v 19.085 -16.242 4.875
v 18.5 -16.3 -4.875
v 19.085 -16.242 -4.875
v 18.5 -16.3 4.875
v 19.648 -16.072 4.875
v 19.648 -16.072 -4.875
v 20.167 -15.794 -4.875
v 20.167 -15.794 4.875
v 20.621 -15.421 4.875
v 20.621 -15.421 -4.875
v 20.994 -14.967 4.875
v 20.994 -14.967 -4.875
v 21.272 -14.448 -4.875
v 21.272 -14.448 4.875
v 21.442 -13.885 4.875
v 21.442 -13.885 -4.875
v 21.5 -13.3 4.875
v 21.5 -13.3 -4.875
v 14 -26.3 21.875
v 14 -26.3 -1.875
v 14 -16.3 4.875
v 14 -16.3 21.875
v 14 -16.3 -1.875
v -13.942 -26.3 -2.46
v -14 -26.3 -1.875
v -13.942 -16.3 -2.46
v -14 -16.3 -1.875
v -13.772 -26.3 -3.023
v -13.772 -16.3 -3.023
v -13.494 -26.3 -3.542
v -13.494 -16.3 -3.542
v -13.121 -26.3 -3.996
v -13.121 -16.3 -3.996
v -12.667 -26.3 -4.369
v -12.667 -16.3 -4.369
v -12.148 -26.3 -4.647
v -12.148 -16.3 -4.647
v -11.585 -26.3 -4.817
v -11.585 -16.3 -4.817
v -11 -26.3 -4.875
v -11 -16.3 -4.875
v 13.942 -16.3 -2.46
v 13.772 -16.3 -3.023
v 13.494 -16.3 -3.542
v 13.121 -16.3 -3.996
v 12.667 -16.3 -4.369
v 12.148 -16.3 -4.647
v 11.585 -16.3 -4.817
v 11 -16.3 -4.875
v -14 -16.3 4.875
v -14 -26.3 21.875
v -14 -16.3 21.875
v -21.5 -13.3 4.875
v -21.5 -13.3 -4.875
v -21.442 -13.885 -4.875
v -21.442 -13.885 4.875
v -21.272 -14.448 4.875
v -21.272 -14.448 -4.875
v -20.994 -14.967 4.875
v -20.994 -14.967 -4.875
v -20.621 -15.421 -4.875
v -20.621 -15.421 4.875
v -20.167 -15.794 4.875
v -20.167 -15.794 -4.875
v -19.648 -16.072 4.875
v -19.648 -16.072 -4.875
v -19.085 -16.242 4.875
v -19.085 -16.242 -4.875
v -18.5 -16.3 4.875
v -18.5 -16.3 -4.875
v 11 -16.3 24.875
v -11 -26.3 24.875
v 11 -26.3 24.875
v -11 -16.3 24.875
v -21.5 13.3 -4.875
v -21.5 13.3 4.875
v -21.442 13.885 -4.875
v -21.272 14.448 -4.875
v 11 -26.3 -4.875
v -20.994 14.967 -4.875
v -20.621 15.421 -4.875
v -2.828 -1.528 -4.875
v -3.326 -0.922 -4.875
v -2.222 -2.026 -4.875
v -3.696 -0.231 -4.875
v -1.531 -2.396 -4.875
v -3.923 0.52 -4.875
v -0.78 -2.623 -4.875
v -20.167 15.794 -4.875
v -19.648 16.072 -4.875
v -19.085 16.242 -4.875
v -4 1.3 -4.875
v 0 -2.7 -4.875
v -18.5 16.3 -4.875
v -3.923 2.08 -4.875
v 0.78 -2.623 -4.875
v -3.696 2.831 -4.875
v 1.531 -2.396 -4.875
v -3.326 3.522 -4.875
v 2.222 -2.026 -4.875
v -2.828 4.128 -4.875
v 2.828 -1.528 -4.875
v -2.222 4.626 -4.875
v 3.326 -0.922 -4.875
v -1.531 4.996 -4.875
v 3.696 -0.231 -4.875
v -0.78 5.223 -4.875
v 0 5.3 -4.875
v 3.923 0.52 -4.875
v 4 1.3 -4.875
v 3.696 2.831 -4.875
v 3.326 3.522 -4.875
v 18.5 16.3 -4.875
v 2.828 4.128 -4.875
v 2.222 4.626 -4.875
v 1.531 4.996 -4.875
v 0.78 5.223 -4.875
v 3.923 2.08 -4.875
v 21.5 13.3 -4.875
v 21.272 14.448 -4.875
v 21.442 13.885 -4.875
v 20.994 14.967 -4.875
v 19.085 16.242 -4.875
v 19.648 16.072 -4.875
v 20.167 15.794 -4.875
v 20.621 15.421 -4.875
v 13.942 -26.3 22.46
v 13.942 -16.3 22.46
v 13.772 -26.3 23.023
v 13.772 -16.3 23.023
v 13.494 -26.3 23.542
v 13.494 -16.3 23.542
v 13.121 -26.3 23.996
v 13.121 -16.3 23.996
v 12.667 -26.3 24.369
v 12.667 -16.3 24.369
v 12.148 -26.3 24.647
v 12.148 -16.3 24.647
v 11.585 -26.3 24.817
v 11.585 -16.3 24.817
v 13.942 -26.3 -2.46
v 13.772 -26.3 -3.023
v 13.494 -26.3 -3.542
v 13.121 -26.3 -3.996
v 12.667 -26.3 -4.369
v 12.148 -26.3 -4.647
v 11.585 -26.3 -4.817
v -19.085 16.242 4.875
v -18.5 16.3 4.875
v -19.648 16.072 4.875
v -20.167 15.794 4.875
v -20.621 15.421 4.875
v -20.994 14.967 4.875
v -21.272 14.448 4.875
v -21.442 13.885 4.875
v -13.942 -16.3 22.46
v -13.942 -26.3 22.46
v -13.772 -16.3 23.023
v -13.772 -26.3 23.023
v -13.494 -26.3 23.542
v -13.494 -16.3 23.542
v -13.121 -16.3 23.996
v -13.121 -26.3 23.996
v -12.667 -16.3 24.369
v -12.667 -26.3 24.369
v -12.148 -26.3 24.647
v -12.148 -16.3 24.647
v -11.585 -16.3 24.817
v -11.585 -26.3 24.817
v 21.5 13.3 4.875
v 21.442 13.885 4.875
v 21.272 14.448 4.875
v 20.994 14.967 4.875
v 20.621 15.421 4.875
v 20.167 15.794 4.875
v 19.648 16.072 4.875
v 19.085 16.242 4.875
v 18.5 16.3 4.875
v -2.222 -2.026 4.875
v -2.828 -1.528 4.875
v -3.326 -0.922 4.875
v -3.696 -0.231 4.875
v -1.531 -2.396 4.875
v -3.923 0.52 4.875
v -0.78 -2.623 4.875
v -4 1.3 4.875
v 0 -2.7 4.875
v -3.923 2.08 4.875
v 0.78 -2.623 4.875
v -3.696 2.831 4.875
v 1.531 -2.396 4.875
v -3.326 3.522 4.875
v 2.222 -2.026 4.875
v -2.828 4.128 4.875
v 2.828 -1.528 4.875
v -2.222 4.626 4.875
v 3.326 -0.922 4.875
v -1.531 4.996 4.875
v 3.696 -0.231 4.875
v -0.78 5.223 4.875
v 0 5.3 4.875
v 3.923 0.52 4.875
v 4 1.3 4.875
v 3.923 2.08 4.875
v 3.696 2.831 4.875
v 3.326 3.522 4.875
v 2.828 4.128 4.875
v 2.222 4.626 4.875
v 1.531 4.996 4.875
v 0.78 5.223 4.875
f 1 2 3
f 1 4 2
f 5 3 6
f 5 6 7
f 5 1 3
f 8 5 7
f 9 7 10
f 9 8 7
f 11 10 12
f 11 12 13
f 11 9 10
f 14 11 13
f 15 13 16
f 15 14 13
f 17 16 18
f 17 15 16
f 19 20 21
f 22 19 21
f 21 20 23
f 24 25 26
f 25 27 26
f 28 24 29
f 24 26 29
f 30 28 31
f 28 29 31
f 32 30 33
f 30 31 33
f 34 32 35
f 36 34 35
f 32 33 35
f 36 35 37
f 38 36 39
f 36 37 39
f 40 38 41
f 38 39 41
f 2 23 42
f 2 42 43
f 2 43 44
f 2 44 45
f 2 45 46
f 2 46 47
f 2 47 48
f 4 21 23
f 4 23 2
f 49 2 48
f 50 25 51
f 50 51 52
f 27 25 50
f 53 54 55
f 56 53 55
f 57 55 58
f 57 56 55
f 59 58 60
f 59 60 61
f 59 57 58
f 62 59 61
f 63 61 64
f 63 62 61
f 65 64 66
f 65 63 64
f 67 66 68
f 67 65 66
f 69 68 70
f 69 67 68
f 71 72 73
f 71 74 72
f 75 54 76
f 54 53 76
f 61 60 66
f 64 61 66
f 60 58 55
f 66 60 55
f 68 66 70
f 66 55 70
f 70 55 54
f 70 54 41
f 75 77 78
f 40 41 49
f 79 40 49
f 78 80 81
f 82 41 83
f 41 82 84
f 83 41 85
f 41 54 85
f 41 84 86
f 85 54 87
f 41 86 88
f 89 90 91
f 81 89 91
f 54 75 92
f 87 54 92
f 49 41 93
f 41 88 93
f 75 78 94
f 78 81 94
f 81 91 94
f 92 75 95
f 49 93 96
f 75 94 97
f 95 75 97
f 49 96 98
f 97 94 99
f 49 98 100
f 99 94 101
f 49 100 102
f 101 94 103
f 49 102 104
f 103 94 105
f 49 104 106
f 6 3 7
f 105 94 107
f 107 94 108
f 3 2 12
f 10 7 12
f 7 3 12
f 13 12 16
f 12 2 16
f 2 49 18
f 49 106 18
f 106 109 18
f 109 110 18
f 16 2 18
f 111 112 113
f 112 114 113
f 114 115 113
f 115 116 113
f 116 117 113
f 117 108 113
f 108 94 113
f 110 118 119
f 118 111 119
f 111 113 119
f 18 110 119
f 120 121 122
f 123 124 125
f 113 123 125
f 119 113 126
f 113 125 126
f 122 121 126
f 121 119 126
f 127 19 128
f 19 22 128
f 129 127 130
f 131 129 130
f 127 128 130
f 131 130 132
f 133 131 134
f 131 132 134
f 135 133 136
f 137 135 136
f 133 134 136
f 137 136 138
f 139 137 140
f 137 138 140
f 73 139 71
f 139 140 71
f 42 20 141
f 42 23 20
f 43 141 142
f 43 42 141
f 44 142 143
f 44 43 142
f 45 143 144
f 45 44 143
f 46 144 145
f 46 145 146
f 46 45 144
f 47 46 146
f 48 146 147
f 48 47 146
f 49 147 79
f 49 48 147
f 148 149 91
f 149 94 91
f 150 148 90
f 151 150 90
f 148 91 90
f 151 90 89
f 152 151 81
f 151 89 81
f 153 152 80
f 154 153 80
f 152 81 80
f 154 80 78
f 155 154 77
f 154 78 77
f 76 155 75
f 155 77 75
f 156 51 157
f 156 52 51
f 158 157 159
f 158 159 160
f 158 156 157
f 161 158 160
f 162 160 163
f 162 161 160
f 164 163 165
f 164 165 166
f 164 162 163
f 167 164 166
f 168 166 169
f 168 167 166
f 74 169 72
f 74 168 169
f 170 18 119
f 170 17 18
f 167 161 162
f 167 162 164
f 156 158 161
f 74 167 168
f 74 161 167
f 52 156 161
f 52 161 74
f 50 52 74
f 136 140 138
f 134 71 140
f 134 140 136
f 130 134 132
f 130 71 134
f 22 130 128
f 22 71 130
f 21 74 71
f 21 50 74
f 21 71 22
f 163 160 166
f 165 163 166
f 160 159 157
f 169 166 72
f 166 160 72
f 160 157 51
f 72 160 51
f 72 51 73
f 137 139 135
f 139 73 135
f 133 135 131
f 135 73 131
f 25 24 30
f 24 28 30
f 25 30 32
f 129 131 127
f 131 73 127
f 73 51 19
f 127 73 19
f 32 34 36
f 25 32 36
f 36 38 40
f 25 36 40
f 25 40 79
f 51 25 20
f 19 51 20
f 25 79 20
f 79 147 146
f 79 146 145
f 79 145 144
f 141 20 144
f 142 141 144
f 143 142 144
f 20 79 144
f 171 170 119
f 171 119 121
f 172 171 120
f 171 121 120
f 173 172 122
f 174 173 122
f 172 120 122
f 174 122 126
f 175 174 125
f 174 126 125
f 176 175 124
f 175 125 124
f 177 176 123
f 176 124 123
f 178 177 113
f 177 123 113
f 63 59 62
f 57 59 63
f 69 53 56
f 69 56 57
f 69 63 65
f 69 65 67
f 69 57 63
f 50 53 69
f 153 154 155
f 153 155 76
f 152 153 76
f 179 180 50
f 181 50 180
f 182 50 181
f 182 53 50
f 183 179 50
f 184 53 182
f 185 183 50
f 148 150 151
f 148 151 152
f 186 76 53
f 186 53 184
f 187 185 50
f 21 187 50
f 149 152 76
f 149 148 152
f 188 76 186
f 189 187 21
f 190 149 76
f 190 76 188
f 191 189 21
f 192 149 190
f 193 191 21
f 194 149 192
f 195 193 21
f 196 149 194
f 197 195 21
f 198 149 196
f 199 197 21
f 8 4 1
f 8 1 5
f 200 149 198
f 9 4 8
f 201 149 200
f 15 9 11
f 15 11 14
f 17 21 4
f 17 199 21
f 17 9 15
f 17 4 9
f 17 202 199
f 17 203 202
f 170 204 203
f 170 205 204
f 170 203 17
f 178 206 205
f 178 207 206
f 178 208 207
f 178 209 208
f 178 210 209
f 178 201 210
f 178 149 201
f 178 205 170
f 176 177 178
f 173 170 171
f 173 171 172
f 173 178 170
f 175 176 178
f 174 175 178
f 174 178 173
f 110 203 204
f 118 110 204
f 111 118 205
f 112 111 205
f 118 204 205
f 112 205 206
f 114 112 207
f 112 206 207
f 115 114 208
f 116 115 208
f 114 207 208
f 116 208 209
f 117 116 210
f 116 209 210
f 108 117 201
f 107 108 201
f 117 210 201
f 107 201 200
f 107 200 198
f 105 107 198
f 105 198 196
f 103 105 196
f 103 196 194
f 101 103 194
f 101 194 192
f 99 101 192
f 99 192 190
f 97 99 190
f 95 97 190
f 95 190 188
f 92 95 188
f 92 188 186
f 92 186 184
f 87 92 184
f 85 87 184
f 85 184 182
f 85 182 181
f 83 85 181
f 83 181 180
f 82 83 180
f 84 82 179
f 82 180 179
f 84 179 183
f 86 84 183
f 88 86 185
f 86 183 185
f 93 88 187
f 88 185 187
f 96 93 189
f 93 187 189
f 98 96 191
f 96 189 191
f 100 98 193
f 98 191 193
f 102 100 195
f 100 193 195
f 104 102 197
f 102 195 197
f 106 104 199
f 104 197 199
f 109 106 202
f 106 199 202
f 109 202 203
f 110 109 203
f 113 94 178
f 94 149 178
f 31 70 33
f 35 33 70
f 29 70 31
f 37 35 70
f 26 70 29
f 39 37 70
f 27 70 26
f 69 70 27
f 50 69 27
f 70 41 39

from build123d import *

# Parameters (mm, degrees)
SKETCH1_W                       = 43
SKETCH1_H                       = 32.6
BOSS_EXTRUDE1_DEPTH             = 4.875
SKETCH2_R                       = 4
CUT_EXTRUDE1_DEPTH              = 29.688020148
BOSS_EXTRUDE3_REACH             = 30.688
SKETCH3_W                       = 28
SKETCH3_H                       = 10
BOSS_EXTRUDE3_DIRECTION_2_DEPTH = 20
FILLET1_R                       = 3


with BuildPart() as part:
    # Sketch1 → Boss-Extrude1 (new, symmetric)
    with BuildSketch(Plane.XY):
        Rectangle(SKETCH1_W, SKETCH1_H)
    extrude(amount=BOSS_EXTRUDE1_DEPTH, both=True)

    # Sketch2 → Cut-Extrude1 (cut, through all)
    with BuildSketch(Plane.XY.offset(4.875)):
        with Locations((0, 1.3)):
            Circle(SKETCH2_R)
    extrude(amount=-CUT_EXTRUDE1_DEPTH, mode=Mode.SUBTRACT)

    # Boss-Extrude3: up to this face of the body (flat: up to its plane)
    boss_extrude3_end = Plane(part.part.faces().sort_by_distance((0, -15.760392735, -4.875))[0])
    # Sketch3 → Boss-Extrude3 (add, up to the picked face)
    with BuildSketch(Plane.XY.offset(4.875), mode=Mode.PRIVATE) as boss_extrude3_sk1:
        with Locations((0, -21.3)):
            Rectangle(SKETCH3_W, SKETCH3_H)
    boss_extrude3_tool1 = split(extrude(boss_extrude3_sk1.sketch, amount=-BOSS_EXTRUDE3_REACH, mode=Mode.PRIVATE), bisect_by=boss_extrude3_end, keep=Keep.BOTH, mode=Mode.PRIVATE)
    add(boss_extrude3_tool1.solids().sort_by(Axis((0, -21.3, 4.875), (0, 0, -1)))[0])

    # Sketch3 → Boss-Extrude3 direction 2 (add)
    with BuildSketch(Plane.XY.offset(4.875)):
        with Locations((0, -21.3)):
            Rectangle(SKETCH3_W, SKETCH3_H)
    extrude(amount=BOSS_EXTRUDE3_DIRECTION_2_DEPTH)

    # Fillet1
    fillet1_edges = [part.edges().sort_by_distance(p)[0] for p in [
        (-14, -21.3, -4.875),
        (14, -21.3, -4.875),
        (-14, -21.3, 24.875),
        (14, -21.3, 24.875),
        (21.5, -16.3, 0),
        (-21.5, -16.3, 0),
        (-21.5, 16.3, 0),
        (21.5, 16.3, 0),
    ]]
    fillet(fillet1_edges, radius=FILLET1_R)


solid = part.part
